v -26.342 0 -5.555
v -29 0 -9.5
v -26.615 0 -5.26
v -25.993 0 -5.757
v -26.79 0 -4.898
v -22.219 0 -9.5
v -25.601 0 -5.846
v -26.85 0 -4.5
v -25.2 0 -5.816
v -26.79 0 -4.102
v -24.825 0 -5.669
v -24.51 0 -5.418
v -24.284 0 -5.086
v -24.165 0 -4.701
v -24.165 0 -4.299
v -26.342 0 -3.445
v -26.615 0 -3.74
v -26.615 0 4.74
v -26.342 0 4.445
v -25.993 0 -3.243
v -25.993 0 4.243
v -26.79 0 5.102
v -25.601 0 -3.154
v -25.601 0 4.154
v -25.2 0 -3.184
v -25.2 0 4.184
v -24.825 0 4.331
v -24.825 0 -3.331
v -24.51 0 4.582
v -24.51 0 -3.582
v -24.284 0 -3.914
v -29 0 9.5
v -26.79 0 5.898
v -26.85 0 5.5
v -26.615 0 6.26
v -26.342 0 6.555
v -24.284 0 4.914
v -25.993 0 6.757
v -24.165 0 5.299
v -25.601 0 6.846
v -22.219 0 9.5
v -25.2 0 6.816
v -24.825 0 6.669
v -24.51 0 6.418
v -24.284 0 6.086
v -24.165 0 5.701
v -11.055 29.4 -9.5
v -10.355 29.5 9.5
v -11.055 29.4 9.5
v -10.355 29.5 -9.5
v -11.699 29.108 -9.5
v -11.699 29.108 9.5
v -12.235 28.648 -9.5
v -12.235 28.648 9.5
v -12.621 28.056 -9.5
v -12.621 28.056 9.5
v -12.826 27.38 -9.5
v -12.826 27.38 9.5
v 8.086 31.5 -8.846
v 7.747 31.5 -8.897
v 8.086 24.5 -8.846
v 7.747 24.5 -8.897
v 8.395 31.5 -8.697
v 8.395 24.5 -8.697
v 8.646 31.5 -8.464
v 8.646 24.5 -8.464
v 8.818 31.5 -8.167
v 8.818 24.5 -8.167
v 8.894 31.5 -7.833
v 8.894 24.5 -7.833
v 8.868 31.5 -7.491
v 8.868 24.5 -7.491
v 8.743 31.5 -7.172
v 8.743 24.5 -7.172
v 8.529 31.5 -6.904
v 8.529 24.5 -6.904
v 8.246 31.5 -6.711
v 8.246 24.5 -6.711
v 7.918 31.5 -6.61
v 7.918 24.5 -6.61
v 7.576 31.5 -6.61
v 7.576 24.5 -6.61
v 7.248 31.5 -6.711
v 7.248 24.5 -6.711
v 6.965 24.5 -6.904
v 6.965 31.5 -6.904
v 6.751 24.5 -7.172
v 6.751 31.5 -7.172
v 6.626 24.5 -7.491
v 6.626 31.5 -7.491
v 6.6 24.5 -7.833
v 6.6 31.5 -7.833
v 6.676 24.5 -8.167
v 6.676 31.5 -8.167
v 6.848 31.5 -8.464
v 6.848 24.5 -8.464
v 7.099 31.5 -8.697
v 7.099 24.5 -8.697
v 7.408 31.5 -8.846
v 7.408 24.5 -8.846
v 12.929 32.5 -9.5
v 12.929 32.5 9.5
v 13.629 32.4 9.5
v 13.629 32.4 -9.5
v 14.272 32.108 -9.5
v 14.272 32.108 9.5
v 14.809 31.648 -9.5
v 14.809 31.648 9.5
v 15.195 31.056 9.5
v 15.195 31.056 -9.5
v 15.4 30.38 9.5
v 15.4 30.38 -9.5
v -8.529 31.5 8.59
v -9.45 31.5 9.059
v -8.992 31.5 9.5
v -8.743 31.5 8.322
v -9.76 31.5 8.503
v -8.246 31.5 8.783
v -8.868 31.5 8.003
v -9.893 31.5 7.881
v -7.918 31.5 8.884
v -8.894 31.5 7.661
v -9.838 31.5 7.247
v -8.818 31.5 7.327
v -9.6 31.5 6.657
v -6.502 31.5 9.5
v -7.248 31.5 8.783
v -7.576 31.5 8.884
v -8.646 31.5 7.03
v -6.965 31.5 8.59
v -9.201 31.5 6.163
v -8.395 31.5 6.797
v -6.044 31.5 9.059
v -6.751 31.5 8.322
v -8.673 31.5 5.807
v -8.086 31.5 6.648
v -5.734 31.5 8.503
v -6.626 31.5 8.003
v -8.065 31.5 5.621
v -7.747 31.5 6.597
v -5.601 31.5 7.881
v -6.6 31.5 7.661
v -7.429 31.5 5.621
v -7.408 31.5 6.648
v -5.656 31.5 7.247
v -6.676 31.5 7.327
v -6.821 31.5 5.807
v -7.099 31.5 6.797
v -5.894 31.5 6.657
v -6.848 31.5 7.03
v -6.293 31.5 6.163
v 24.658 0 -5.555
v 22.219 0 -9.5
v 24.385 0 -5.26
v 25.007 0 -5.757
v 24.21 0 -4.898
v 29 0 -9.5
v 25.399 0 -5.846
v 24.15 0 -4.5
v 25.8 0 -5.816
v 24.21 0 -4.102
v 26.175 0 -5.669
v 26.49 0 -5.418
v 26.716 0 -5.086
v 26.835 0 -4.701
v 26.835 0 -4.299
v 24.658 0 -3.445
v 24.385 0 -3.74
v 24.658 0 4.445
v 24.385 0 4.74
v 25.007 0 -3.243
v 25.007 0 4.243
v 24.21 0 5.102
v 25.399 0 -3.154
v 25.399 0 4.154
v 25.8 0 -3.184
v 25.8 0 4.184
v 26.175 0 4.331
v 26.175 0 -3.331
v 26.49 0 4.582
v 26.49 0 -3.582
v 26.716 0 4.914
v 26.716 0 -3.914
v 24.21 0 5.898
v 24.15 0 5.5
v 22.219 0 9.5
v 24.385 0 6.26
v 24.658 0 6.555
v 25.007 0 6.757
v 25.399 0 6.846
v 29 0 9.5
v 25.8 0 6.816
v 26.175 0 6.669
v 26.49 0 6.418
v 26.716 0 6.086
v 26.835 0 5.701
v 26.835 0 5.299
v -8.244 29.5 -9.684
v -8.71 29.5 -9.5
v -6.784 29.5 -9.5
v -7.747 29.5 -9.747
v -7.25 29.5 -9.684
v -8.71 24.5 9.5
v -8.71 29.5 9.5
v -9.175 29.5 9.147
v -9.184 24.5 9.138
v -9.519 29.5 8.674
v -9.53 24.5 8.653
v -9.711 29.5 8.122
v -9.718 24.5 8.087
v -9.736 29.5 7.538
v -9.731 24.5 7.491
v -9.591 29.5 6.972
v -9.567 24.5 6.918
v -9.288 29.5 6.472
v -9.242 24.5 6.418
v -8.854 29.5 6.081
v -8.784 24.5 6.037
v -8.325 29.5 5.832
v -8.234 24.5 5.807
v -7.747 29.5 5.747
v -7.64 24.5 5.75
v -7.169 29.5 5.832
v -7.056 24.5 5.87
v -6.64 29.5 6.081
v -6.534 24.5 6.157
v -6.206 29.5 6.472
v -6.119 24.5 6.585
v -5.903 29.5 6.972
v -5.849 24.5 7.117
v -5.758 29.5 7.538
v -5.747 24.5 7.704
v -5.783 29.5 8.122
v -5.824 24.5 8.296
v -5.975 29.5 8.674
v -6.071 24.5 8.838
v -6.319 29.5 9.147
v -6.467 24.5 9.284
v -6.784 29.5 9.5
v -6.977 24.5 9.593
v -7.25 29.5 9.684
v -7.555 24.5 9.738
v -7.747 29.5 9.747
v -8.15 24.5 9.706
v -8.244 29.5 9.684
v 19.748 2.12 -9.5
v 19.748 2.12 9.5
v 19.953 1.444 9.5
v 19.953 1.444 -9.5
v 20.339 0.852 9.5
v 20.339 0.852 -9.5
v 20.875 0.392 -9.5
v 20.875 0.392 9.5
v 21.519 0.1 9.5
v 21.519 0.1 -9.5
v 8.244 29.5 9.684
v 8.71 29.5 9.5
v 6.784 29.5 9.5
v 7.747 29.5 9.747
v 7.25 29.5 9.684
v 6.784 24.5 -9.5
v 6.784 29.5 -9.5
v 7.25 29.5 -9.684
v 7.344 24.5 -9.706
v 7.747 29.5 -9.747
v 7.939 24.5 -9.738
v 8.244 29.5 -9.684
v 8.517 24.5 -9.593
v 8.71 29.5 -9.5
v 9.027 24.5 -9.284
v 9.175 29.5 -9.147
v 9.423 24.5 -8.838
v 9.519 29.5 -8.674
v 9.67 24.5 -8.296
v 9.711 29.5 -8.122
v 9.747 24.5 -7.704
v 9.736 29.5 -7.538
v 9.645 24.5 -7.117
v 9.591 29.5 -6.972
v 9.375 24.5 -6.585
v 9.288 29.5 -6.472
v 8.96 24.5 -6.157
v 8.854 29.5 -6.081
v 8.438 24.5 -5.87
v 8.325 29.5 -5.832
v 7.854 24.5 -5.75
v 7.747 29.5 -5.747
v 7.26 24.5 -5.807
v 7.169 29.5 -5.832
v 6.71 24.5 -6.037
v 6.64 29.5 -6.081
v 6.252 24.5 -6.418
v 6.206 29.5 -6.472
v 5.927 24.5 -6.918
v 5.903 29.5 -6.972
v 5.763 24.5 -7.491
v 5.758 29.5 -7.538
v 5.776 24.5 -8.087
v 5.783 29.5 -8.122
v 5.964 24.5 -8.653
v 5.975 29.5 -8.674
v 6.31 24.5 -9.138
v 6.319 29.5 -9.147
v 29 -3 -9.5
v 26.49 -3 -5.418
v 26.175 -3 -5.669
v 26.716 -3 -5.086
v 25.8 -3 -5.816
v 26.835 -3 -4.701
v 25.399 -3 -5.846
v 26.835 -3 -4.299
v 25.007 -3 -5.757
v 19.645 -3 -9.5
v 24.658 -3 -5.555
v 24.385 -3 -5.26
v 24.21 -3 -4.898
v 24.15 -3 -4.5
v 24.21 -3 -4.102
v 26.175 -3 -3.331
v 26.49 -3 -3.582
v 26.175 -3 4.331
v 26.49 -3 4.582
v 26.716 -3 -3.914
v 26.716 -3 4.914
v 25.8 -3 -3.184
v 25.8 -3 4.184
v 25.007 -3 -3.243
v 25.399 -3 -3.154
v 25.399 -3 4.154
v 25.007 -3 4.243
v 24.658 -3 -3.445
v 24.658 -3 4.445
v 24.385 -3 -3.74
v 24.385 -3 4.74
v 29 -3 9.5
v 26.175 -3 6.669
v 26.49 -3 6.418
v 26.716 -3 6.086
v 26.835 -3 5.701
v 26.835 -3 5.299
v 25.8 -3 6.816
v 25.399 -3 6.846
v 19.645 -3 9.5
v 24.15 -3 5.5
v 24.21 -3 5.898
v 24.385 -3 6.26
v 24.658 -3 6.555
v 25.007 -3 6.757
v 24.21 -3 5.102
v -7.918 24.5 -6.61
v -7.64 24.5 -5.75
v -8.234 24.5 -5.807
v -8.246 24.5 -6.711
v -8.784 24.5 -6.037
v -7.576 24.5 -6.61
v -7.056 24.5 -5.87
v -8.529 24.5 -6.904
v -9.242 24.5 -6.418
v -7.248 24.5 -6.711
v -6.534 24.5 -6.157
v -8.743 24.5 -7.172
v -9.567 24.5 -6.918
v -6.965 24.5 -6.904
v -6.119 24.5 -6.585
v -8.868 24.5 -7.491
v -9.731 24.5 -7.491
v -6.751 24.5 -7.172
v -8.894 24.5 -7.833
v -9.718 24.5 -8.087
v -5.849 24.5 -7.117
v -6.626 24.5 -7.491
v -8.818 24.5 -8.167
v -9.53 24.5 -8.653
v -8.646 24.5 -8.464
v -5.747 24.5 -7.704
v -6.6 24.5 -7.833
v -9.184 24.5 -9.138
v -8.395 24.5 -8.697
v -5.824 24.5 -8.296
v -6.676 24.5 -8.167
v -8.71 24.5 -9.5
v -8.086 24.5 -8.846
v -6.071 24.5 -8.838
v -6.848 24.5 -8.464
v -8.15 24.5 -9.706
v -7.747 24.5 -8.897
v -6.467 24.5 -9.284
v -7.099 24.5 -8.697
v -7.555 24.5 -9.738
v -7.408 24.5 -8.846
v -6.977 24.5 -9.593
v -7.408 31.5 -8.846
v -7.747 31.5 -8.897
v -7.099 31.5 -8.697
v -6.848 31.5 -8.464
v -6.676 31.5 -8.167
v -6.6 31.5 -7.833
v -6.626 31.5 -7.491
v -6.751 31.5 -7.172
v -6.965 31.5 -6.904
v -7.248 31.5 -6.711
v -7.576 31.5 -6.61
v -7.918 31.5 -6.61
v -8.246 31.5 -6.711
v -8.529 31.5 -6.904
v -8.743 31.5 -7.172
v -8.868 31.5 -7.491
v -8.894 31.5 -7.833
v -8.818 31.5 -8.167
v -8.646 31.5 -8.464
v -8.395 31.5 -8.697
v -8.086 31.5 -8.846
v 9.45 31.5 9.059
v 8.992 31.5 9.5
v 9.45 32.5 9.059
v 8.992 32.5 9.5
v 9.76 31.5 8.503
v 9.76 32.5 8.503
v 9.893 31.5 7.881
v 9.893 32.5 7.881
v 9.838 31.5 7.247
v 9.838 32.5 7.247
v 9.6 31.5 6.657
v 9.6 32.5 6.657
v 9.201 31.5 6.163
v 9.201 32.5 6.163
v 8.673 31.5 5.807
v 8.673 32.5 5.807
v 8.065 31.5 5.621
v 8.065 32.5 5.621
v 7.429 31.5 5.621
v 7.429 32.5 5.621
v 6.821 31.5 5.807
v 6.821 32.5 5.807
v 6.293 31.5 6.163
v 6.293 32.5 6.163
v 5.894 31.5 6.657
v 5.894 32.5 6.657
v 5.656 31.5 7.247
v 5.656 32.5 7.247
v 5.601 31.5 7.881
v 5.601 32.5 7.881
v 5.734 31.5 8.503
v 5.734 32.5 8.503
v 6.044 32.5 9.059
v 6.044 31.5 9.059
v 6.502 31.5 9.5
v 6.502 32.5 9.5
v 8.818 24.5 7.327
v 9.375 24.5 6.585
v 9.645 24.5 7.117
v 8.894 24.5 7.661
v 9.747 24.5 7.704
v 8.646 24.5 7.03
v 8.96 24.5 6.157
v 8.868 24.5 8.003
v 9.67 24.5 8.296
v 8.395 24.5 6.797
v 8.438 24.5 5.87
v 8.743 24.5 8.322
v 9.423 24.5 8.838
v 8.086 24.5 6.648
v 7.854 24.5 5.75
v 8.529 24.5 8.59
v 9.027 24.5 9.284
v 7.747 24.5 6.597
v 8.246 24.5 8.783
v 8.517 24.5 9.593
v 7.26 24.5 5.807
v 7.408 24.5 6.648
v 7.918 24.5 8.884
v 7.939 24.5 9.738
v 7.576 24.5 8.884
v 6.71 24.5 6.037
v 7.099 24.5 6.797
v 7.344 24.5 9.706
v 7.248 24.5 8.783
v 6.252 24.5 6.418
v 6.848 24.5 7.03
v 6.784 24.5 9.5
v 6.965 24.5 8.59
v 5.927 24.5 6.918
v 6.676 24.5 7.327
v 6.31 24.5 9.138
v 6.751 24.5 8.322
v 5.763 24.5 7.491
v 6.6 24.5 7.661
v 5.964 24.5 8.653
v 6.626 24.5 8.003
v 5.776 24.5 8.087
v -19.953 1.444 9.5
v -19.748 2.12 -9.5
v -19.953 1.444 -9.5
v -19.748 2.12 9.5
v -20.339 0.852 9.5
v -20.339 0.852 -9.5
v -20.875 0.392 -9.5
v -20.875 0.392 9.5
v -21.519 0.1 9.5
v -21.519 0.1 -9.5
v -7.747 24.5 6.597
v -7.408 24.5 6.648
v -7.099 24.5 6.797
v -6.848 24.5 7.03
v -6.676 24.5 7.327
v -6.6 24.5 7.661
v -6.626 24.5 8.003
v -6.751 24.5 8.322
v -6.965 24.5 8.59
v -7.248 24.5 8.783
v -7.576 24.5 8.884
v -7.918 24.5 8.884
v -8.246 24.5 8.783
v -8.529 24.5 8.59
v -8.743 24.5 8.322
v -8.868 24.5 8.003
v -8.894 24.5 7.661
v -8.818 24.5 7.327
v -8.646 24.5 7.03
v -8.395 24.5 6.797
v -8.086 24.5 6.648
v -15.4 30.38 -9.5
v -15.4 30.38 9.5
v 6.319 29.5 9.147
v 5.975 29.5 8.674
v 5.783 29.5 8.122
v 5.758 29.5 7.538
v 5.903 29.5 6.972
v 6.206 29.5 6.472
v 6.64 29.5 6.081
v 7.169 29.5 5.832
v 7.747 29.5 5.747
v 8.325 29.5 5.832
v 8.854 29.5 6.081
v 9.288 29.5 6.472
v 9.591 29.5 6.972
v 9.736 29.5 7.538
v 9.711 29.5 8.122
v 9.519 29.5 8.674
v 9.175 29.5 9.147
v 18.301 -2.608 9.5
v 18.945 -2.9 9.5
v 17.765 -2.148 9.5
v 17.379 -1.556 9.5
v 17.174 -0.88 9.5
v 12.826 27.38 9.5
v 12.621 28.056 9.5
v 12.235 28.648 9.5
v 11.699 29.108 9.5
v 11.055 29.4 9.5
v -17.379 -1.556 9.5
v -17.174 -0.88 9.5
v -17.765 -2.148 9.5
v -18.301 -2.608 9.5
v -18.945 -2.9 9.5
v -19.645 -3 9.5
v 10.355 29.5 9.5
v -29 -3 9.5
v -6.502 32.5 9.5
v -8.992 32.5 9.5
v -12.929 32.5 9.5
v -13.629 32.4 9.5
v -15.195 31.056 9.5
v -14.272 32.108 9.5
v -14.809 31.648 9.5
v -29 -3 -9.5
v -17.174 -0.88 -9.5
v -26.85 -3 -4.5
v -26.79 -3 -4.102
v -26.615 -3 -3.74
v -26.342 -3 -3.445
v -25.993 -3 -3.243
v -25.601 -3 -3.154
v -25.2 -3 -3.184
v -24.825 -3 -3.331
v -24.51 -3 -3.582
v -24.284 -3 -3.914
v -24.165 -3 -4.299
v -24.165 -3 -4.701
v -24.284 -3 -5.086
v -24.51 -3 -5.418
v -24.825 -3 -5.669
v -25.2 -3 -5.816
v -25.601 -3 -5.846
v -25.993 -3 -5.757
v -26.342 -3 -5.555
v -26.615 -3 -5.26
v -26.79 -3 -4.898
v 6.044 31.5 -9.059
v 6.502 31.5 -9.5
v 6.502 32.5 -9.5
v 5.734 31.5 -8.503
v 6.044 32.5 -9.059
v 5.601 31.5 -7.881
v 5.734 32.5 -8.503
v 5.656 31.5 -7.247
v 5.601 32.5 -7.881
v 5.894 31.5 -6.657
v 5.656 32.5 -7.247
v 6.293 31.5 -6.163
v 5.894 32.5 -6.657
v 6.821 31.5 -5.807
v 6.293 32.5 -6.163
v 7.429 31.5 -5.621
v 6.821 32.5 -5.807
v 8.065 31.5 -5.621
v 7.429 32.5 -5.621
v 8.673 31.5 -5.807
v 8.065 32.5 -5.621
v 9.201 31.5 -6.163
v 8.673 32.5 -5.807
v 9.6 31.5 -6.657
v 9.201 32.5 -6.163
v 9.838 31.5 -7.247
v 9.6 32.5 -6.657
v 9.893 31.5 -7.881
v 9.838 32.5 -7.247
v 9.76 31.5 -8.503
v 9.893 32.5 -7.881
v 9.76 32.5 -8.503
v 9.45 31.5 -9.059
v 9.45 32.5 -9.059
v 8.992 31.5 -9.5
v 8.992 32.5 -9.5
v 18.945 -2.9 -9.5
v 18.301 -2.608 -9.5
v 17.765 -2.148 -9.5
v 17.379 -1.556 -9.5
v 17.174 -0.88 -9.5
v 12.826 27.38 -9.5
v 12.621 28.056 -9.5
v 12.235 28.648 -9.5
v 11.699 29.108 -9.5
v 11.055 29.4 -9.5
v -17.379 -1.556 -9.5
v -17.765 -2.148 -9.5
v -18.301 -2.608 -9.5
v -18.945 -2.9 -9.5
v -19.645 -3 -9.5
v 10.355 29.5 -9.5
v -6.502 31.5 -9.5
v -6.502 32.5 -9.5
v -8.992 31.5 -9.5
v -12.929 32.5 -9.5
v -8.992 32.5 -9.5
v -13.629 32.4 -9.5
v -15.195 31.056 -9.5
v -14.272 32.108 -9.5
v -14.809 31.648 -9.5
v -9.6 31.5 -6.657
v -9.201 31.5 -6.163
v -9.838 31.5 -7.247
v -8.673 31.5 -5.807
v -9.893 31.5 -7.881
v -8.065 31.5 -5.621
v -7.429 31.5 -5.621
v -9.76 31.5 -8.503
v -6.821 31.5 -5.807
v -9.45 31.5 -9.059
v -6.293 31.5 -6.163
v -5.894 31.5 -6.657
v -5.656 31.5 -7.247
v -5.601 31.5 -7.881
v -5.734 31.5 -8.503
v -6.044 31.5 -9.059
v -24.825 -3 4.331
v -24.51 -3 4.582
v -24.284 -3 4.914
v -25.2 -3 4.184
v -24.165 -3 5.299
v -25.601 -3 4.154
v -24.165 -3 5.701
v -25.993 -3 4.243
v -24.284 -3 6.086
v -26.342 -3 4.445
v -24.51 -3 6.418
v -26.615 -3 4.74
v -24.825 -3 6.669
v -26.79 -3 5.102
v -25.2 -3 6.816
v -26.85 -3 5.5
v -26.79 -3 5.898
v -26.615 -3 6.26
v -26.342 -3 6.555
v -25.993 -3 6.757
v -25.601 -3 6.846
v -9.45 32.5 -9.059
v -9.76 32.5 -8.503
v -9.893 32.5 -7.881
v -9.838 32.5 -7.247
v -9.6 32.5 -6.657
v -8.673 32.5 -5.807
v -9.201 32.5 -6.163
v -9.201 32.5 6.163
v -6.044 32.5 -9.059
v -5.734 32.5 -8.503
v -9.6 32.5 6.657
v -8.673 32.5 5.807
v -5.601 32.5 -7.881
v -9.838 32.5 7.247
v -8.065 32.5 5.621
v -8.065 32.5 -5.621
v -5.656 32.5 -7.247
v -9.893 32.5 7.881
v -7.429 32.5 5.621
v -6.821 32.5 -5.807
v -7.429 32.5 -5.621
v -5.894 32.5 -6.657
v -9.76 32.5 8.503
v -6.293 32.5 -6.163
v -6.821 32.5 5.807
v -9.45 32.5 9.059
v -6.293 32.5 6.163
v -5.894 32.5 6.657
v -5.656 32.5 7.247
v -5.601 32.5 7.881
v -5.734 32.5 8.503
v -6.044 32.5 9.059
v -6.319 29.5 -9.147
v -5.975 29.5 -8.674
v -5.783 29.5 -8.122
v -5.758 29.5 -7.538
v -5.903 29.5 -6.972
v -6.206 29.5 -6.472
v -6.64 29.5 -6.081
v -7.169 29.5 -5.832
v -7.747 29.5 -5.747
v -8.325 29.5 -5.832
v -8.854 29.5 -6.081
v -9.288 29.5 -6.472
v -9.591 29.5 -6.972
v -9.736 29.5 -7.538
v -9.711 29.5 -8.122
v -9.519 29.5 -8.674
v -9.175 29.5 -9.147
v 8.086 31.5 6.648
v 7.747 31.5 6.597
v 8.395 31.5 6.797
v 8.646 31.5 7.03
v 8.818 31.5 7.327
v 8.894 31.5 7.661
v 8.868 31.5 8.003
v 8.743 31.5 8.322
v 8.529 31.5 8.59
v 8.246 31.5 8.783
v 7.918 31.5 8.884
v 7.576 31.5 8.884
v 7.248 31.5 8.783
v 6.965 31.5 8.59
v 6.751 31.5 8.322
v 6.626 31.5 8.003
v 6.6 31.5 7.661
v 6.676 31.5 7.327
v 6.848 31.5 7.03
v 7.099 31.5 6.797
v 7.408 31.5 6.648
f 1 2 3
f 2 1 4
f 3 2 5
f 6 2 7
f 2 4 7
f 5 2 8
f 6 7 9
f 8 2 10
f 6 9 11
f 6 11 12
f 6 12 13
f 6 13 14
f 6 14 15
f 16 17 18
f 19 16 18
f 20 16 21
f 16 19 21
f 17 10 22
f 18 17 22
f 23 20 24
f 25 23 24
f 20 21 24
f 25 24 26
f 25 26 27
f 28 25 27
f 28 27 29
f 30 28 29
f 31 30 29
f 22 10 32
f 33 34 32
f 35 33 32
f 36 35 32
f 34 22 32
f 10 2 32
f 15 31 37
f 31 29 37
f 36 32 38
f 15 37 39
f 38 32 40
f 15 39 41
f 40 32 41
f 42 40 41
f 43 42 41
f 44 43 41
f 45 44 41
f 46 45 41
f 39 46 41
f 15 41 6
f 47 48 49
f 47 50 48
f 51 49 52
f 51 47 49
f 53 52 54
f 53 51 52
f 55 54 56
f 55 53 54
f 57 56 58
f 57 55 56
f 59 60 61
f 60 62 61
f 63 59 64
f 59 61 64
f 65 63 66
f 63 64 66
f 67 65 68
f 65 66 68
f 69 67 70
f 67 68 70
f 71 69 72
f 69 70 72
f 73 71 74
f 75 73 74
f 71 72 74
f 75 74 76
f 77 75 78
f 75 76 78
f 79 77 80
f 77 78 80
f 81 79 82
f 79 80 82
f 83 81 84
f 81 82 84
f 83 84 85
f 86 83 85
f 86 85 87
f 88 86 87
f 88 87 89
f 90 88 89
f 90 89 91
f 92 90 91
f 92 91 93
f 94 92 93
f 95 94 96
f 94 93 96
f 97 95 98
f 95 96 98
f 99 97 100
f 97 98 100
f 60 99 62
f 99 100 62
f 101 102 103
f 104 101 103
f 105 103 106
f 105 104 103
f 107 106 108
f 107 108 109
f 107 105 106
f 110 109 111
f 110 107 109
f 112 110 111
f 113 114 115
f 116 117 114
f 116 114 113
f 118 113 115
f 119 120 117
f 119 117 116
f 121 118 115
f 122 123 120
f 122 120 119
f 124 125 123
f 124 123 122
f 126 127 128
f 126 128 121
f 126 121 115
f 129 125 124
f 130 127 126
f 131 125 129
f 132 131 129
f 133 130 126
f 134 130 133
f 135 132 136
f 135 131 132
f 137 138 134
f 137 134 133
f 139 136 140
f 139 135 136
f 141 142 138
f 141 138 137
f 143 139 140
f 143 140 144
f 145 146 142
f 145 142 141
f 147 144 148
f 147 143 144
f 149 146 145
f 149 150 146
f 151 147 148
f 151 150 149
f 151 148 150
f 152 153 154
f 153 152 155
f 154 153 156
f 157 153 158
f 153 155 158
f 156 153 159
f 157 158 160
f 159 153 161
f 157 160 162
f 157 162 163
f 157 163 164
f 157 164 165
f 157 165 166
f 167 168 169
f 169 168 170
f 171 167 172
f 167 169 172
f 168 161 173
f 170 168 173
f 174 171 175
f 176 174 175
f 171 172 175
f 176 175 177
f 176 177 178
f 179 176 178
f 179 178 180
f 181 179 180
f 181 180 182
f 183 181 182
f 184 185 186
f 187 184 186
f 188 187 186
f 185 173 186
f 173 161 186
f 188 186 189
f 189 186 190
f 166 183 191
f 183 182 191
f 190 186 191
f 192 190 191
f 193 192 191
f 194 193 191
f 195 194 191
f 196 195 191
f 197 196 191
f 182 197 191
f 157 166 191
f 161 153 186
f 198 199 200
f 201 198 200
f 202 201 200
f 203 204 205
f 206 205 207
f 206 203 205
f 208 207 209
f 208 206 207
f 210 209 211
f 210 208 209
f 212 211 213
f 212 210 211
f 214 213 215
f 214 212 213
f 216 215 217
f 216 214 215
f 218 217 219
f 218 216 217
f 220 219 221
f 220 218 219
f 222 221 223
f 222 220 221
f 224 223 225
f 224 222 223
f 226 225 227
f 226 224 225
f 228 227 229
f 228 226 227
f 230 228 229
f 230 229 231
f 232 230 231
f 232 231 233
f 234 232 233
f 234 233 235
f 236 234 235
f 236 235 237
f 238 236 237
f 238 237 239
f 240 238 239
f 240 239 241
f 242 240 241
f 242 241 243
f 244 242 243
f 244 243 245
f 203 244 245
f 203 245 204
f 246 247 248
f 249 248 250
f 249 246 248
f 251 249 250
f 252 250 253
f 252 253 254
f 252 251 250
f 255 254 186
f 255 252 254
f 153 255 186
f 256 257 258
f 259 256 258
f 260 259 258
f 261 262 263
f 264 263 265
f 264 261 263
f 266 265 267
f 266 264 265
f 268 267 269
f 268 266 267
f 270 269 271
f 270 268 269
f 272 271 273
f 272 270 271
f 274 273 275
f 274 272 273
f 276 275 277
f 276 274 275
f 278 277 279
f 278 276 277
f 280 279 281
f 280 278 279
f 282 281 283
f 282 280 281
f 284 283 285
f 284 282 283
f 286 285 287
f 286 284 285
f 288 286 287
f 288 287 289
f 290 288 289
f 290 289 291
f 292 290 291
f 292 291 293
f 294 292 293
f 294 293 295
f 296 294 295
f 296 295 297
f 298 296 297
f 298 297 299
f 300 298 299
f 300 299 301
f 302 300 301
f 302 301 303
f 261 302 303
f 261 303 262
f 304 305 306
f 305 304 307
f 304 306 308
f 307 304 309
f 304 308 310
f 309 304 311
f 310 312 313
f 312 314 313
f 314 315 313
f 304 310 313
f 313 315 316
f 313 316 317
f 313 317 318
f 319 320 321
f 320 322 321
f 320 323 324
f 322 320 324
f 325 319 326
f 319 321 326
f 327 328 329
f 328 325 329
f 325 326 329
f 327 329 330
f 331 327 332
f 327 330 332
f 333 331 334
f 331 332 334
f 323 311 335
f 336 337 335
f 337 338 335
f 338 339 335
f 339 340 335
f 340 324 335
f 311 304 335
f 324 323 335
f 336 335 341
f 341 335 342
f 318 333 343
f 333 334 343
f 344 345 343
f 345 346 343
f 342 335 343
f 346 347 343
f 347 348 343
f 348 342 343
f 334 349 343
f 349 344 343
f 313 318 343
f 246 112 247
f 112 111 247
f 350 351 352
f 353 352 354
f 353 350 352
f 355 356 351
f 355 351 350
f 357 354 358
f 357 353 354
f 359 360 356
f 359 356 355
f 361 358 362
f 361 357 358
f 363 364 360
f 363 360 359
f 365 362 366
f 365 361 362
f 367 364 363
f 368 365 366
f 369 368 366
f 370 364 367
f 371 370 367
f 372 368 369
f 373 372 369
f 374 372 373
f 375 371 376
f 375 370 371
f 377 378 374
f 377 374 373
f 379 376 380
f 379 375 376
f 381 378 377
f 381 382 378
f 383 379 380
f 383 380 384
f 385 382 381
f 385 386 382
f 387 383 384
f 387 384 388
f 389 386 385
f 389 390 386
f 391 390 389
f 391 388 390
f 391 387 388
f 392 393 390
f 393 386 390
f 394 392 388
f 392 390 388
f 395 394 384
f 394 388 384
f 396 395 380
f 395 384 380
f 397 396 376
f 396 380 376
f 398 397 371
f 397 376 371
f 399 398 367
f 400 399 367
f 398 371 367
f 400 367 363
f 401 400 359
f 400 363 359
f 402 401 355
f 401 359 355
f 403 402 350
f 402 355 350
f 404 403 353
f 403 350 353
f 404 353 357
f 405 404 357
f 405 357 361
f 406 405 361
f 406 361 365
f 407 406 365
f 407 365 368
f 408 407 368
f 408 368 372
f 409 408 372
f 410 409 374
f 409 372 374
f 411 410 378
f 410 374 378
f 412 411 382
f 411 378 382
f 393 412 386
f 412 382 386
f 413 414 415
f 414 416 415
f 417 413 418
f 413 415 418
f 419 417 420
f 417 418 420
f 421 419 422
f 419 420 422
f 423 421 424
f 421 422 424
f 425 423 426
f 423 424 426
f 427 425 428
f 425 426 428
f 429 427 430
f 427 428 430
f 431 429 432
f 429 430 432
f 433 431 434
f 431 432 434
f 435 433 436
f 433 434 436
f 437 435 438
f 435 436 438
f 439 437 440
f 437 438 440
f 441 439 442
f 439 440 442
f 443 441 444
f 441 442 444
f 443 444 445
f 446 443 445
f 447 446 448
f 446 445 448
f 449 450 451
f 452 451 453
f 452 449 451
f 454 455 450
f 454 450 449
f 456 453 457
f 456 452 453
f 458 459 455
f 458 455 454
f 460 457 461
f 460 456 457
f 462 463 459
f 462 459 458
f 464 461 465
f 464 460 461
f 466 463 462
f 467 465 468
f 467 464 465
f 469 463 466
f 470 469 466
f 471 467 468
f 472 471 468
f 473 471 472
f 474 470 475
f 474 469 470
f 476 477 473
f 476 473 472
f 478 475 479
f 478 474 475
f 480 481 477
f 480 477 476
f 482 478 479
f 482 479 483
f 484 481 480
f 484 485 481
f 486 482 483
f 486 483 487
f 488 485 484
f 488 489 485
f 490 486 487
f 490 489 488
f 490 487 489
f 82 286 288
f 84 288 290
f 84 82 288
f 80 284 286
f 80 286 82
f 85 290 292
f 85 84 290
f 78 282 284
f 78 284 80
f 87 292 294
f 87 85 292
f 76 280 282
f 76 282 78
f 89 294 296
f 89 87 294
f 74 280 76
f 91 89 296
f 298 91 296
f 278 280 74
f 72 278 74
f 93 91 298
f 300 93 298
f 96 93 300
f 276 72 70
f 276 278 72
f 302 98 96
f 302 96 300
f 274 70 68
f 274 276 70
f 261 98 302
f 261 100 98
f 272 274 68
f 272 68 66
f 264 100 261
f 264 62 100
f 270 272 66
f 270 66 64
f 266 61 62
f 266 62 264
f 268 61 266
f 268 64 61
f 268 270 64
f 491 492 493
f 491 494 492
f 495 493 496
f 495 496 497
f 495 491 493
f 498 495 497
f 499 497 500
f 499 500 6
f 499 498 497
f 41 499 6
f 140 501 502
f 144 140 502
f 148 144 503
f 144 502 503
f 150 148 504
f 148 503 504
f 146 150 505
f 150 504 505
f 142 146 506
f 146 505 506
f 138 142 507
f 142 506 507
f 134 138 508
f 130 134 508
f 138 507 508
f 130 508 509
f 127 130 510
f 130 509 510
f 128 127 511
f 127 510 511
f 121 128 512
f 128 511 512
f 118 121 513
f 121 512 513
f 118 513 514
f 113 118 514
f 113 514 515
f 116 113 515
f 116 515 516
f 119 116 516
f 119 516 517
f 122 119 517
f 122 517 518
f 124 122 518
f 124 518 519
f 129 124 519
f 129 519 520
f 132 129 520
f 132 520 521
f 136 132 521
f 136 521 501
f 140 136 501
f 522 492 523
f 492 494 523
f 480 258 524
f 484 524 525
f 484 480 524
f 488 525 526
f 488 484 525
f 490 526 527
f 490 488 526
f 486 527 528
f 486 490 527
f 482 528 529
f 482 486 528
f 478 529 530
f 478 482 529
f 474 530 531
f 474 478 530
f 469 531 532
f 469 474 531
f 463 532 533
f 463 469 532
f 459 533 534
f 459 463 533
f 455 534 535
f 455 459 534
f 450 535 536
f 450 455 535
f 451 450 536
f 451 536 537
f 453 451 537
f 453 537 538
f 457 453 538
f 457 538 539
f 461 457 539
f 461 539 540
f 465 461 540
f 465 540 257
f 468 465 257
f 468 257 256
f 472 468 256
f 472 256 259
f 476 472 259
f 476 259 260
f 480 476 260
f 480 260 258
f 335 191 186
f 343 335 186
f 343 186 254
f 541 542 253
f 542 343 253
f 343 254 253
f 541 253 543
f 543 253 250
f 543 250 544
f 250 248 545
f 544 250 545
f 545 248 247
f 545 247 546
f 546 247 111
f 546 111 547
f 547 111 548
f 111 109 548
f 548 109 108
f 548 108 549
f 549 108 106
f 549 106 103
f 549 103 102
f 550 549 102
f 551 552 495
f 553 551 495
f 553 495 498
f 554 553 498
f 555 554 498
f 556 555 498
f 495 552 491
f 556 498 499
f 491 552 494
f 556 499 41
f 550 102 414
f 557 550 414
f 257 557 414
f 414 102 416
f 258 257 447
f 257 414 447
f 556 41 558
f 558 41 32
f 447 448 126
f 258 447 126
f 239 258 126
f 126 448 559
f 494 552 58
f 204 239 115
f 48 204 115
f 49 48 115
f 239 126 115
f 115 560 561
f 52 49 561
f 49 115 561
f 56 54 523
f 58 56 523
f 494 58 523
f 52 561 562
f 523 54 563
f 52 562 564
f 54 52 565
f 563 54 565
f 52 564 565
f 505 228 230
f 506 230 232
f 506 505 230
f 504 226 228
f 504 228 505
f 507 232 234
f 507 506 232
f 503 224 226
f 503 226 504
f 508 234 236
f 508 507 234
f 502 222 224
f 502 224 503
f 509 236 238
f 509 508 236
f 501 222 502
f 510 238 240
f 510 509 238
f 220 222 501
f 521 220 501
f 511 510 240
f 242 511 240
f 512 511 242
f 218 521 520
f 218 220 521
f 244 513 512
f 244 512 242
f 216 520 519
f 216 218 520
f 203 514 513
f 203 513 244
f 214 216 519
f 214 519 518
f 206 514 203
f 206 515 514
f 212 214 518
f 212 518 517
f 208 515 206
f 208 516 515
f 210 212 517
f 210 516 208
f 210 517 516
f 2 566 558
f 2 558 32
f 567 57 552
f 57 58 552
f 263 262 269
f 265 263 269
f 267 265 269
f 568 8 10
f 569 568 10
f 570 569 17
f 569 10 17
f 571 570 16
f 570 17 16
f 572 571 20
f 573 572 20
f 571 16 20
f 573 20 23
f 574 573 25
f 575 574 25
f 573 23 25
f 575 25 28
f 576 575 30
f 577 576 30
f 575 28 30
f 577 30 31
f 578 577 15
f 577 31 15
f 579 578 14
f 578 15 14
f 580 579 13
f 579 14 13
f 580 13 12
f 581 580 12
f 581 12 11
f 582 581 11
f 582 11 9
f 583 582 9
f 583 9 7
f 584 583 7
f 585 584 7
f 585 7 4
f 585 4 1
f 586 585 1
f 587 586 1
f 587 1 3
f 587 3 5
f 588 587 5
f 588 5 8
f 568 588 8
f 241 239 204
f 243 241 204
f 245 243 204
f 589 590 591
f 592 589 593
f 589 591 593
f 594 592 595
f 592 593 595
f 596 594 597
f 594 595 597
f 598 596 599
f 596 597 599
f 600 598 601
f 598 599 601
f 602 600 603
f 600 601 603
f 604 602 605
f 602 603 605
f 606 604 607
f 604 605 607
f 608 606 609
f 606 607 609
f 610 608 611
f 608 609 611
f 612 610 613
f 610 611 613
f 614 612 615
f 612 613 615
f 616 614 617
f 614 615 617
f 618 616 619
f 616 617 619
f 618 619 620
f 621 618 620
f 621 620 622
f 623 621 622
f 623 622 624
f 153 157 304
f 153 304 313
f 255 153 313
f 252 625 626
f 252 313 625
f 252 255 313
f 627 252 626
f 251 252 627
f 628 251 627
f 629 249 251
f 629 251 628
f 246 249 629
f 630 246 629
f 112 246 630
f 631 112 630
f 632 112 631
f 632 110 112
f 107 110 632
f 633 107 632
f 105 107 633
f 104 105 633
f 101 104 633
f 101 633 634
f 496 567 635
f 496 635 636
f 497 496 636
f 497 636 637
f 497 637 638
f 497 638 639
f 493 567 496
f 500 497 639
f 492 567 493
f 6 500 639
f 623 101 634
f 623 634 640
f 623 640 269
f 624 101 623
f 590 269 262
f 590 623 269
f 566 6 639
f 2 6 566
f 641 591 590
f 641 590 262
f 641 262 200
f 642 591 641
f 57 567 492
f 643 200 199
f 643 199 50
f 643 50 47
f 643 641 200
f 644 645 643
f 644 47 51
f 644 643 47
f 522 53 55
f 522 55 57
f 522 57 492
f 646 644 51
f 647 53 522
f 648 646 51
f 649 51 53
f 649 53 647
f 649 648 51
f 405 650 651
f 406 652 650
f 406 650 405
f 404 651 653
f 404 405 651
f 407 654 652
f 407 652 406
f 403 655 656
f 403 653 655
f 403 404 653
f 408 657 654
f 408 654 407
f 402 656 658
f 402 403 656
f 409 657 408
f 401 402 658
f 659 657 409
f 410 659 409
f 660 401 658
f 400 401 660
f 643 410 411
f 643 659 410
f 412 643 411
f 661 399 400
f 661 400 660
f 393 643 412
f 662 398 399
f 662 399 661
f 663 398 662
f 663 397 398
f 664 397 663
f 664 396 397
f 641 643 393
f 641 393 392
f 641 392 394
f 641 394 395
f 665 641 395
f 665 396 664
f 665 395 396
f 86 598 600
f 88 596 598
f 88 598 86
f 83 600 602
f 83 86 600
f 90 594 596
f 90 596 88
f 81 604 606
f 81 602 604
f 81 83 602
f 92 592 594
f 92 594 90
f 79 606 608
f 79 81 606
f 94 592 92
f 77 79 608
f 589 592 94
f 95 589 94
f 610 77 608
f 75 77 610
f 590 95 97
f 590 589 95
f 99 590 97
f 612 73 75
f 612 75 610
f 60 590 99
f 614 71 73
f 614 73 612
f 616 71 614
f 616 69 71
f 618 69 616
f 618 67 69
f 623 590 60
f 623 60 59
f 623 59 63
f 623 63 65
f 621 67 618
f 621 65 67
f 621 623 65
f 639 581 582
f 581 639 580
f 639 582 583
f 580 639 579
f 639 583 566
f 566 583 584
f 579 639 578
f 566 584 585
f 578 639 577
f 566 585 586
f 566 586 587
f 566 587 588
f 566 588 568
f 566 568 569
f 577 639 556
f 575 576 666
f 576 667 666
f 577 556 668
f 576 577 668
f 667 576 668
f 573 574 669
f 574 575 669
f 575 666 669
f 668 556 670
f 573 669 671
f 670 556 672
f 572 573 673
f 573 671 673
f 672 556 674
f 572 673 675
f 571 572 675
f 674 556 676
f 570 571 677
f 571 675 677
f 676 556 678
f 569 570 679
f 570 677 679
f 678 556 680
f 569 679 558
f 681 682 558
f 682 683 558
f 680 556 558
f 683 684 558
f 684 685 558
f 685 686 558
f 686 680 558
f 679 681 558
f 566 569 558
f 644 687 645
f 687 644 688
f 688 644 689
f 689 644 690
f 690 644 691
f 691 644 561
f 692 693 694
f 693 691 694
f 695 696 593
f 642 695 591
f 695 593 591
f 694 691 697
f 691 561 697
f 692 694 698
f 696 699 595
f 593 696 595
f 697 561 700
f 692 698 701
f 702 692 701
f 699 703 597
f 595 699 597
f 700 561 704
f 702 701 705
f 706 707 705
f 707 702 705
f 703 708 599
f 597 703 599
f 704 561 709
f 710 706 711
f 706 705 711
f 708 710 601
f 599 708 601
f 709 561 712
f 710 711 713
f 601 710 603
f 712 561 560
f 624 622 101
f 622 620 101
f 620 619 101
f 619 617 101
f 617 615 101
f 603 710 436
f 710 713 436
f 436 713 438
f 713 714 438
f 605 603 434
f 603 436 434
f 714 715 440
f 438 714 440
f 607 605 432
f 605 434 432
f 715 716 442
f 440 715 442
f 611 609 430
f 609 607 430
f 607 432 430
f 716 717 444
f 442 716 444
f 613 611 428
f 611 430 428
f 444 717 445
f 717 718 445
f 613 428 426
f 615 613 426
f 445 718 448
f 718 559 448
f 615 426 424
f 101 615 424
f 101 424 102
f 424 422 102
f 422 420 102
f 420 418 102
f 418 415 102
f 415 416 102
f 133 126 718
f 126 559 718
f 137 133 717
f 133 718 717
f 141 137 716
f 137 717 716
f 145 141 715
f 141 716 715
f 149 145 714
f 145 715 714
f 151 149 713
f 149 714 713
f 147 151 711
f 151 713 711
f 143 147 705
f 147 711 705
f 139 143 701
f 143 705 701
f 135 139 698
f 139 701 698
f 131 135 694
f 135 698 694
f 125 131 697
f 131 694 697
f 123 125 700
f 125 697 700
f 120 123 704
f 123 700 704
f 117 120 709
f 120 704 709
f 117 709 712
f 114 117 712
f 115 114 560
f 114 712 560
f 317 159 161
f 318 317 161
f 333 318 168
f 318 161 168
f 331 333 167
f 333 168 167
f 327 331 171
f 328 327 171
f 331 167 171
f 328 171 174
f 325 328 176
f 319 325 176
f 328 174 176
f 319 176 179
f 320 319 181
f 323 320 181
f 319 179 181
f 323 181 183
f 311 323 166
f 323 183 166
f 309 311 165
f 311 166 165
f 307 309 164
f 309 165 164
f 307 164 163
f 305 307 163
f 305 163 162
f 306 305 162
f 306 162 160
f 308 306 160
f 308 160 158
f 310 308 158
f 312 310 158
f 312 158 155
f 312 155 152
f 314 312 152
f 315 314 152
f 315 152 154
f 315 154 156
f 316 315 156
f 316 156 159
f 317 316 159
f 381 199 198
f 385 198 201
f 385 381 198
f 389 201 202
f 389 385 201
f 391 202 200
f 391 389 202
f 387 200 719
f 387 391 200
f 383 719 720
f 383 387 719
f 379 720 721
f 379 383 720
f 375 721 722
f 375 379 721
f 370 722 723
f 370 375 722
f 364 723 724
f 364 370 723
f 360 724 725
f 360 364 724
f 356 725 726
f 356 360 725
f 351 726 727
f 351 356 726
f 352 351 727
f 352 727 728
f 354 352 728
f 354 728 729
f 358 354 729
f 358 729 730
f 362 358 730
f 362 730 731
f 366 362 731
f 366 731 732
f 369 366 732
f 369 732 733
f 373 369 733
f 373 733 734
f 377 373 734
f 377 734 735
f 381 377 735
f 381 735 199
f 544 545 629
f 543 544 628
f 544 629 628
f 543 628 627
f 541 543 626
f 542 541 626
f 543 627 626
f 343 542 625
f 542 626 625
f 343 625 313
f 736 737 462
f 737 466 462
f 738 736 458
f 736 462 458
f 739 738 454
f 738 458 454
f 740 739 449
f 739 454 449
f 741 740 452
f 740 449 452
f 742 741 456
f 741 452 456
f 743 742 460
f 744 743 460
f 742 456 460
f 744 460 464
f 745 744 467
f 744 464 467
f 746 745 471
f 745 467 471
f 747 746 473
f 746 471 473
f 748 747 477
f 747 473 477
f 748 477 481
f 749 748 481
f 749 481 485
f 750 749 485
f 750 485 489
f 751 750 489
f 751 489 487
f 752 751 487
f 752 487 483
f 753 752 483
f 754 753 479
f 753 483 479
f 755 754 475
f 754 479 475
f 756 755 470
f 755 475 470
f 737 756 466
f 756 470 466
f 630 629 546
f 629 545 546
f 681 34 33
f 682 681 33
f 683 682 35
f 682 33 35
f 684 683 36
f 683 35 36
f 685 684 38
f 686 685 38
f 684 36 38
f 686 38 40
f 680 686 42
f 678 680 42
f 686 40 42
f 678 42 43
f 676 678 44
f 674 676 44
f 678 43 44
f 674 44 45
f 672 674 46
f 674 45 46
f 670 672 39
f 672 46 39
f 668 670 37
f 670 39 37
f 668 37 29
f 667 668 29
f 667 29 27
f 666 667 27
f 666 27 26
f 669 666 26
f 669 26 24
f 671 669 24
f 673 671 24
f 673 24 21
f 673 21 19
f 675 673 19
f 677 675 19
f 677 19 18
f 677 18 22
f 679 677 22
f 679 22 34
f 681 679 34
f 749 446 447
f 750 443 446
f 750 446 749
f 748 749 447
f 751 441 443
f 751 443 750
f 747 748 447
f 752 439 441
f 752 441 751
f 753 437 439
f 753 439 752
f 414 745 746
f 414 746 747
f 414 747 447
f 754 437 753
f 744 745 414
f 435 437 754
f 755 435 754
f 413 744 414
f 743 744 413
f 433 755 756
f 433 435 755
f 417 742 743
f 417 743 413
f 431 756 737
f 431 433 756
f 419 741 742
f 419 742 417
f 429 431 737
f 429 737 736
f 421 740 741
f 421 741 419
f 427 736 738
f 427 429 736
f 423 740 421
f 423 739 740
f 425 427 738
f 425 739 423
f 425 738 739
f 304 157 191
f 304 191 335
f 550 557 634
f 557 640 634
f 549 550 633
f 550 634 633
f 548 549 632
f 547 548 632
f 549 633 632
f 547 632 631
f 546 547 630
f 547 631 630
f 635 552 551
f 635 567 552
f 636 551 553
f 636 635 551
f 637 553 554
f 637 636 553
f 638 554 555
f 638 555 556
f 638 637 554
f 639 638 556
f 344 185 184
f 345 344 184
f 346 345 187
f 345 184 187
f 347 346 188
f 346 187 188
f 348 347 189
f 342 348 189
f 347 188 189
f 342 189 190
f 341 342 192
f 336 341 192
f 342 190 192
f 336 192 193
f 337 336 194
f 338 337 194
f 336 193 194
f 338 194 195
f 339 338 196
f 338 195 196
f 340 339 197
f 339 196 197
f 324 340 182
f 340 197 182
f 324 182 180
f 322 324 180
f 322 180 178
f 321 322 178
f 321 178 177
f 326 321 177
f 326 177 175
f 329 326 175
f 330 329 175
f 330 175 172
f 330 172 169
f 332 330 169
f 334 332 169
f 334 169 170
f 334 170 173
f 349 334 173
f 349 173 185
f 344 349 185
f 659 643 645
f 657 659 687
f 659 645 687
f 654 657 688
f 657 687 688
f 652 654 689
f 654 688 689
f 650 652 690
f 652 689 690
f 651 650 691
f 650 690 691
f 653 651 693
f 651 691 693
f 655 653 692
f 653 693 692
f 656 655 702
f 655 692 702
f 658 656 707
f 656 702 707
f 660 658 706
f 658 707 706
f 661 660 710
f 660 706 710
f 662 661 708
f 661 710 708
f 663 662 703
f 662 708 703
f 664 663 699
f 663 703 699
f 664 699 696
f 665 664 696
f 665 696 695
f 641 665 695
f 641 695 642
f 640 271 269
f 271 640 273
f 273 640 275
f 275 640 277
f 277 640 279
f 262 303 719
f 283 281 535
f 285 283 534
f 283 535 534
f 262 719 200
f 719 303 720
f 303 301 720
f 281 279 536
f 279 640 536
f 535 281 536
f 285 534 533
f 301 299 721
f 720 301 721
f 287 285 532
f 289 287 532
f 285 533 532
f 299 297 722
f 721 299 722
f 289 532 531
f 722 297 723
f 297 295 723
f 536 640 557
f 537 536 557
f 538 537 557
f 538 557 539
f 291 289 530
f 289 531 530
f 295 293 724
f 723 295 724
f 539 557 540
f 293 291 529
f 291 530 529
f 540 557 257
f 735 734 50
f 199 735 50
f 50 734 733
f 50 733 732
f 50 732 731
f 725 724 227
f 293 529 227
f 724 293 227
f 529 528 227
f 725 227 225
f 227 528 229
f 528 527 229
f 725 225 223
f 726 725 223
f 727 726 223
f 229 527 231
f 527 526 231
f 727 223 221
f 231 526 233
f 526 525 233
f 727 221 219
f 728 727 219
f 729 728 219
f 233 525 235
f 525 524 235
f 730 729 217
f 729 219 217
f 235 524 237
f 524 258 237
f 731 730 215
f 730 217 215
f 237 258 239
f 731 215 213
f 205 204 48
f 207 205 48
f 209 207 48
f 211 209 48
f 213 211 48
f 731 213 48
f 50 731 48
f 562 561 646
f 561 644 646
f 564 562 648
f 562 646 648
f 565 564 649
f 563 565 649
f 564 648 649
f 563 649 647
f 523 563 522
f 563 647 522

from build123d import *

# Parameters (mm, degrees)
EXTRUDE_1_DEPTH     = 9.5
SKETCH_2_R          = 1.15
CUT_EXTRUDE_1_DEPTH = 45.58138625
EXTRUDE_START       = 5
SKETCH_3_R          = 2
SKETCH_3_R_2        = 1.15
EXTRUDE_2_DEPTH     = 5
SKETCH_4_R          = 1.35
CUT_EXTRUDE_2_DEPTH = 45.634672722
FILLET_1_R          = 2.5
SKETCH_5_R          = 2.15
CUT_EXTRUDE_3_DEPTH = 1


with BuildPart() as part:
    # 草图1 → 凸台-拉伸1 (new, symmetric)
    with BuildSketch(Plane.XY):
        Polygon((-20.07375687, 0), (-15.07375687, 32.5), (15.07375687, 32.5), (20.07375687, 0), (29, 0), (29, -3), (17.5, -3), (12.5, 29.5), (-12.5, 29.5), (-17.5, -3), (-29, -3), (-29, 0), align=None)
    extrude(amount=EXTRUDE_1_DEPTH, both=True)

    # 草图2 → 切除-拉伸1 (cut, through all)
    with BuildSketch(Plane.XZ.offset(-29.5)):
        with Locations(Location((-7.747, 7.747, 0), (0, 0, 270))):
            Circle(SKETCH_2_R)
        with Locations(Location((7.747, 7.747, 0), (0, 0, 270))):
            Circle(SKETCH_2_R)
        with Locations(Location((7.747, -7.747, 0), (0, 0, 270))):
            Circle(SKETCH_2_R)
        with Locations(Location((-7.747, -7.747, 0), (0, 0, 270))):
            Circle(SKETCH_2_R)
    extrude(amount=-CUT_EXTRUDE_1_DEPTH, mode=Mode.SUBTRACT)

    # 草图3 → 凸台-拉伸2 (add)
    # profile 1 of 4: a face of its own
    with BuildSketch(Plane.XZ.offset(-29.5).offset(EXTRUDE_START)):
        with Locations(Location((-7.747, 7.747, 0), (0, 0, 118.776999733))):
            Circle(SKETCH_3_R)
        with Locations(Location((-7.747, 7.747, 0), (0, 0, 270))):
            Circle(SKETCH_3_R_2, mode=Mode.SUBTRACT)
    # profile 2 of 4: a face of its own
    with BuildSketch(Plane.XZ.offset(-29.5).offset(EXTRUDE_START)):
        with Locations(Location((7.747, 7.747, 0), (0, 0, 118.776999733))):
            Circle(SKETCH_3_R)
        with Locations(Location((7.747, 7.747, 0), (0, 0, 270))):
            Circle(SKETCH_3_R_2, mode=Mode.SUBTRACT)
    # profile 3 of 4: a face of its own
    with BuildSketch(Plane.XZ.offset(-29.5).offset(EXTRUDE_START)):
        with Locations(Location((7.747, -7.747, 0), (0, 0, 241.223000267))):
            Circle(SKETCH_3_R)
        with Locations(Location((7.747, -7.747, 0), (0, 0, 270))):
            Circle(SKETCH_3_R_2, mode=Mode.SUBTRACT)
    # profile 4 of 4: a face of its own
    with BuildSketch(Plane.XZ.offset(-29.5).offset(EXTRUDE_START)):
        with Locations(Location((-7.747, -7.747, 0), (0, 0, 241.223000267))):
            Circle(SKETCH_3_R)
        with Locations(Location((-7.747, -7.747, 0), (0, 0, 270))):
            Circle(SKETCH_3_R_2, mode=Mode.SUBTRACT)
    extrude(amount=-EXTRUDE_2_DEPTH)

    # 草图4 → 切除-拉伸2 (cut, through all)
    with BuildSketch(Plane(origin=(0, 0, 0), x_dir=(1, 0, 0), z_dir=(0, 1, 0))):
        with Locations(Location((-25.5, 4.5, 0), (0, 0, 180))):
            Circle(SKETCH_4_R)
        with Locations(Location((-25.5, -5.5, 0), (0, 0, 180))):
            Circle(SKETCH_4_R)
        with Locations(Location((25.5, 4.5, 0), (0, 0, 180))):
            Circle(SKETCH_4_R)
        with Locations(Location((25.5, -5.5, 0), (0, 0, 180))):
            Circle(SKETCH_4_R)
    extrude(amount=-CUT_EXTRUDE_2_DEPTH, mode=Mode.SUBTRACT)

    # 圆角1
    fillet_1_edges = [part.edges().sort_by_distance(p)[0] for p in [
        (-20.07375687, 0, 0),
        (-15.07375687, 32.5, 0),
        (15.07375687, 32.5, 0),
        (20.07375687, 0, 0),
        (17.5, -3, 0),
        (12.5, 29.5, 0),
        (-12.5, 29.5, 0),
        (-17.5, -3, 0),
    ]]
    fillet(fillet_1_edges, radius=FILLET_1_R)

    # 草图5 → 切除-拉伸3 (cut)
    with BuildSketch(Plane(origin=(0, 32.5, 0), x_dir=(1, 0, 0), z_dir=(0, 1, 0))):
        with Locations((-7.747, -7.747)):
            Circle(SKETCH_5_R)
        with Locations((7.747, -7.747)):
            Circle(SKETCH_5_R)
        with Locations((7.747, 7.747)):
            Circle(SKETCH_5_R)
        with Locations((-7.747, 7.747)):
            Circle(SKETCH_5_R)
    extrude(amount=-CUT_EXTRUDE_3_DEPTH, mode=Mode.SUBTRACT)


solid = part.part
